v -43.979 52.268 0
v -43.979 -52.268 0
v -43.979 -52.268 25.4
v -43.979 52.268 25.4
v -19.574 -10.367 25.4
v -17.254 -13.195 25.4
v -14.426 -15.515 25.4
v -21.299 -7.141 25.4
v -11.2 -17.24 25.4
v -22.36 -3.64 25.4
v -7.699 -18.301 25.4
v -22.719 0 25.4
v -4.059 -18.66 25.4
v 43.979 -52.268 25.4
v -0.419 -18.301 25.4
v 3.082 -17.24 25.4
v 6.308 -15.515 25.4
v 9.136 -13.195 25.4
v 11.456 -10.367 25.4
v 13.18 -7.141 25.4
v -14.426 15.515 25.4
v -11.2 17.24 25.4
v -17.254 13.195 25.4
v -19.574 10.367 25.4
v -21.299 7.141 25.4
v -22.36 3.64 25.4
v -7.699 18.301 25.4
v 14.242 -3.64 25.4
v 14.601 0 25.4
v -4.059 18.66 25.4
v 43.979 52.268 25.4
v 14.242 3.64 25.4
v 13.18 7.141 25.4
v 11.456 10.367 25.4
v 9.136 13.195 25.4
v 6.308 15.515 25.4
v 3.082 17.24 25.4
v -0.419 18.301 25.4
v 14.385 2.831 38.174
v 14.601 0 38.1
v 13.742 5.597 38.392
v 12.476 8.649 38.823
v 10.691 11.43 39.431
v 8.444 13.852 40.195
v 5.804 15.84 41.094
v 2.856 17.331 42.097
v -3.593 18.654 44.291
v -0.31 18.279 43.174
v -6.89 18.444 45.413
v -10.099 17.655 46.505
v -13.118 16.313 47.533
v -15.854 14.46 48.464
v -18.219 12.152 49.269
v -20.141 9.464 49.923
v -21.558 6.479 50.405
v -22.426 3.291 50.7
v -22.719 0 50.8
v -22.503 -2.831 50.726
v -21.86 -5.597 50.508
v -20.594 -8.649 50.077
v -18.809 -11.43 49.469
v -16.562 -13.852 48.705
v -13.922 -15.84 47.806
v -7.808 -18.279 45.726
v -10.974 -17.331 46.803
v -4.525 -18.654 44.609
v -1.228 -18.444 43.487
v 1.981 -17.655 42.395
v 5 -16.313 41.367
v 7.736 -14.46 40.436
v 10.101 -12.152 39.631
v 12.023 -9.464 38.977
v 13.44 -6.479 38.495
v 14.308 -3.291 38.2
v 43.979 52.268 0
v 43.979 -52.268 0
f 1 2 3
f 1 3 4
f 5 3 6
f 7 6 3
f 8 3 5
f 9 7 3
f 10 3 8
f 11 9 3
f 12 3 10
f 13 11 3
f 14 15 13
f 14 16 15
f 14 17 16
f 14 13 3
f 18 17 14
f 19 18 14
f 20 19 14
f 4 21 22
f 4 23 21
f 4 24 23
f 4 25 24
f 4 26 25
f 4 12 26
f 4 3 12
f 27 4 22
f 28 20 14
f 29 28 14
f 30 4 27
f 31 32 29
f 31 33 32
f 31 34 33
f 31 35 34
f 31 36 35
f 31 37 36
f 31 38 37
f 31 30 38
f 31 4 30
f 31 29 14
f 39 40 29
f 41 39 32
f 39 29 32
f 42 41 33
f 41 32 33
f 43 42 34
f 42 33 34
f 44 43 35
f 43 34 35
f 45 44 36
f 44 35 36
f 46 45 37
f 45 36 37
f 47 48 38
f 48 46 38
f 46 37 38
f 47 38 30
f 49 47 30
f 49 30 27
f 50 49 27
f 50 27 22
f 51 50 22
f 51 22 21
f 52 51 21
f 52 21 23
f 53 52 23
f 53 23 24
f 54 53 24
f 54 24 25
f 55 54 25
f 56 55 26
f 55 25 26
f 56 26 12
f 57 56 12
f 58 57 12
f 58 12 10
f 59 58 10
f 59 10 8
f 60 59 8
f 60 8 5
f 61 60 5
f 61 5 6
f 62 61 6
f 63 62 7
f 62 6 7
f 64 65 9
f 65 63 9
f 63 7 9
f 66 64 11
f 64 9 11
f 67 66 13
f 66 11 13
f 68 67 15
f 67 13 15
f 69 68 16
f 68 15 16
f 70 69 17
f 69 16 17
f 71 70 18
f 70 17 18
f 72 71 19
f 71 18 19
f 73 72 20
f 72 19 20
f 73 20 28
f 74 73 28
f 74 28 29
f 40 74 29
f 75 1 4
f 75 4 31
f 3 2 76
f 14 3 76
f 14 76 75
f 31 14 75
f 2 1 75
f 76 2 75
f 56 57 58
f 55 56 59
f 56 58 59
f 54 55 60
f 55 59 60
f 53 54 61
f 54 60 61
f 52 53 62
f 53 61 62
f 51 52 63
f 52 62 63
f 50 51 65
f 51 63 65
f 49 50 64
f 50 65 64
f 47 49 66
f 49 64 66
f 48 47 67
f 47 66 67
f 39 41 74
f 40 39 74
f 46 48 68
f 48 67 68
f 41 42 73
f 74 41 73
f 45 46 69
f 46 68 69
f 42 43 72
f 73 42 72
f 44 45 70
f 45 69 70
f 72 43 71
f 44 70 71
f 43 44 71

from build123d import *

# Parameters (mm, degrees)
F0_W     = 87.957568
F0_H     = 104.53599
F1_DEPTH = 25.4
F2_R     = 18.659925
F3_DEPTH = 25.4
F5_DEPTH = 104.536989


with BuildPart() as f1:
    # F0 (on Top) → F1 (new body)
    with BuildSketch(Plane.XY):
        Rectangle(F0_W, F0_H)
    extrude(amount=F1_DEPTH)

    # F2 (on face) → F3 (join)
    with BuildSketch(Plane.XY.offset(25.4)):
        with Locations((-4.059047, 0)):
            Circle(F2_R)
    extrude(amount=F3_DEPTH)

    # F4 (on face) → F5 (cut, through all)
    with BuildSketch(Plane.XZ.offset(52.267995)):
        Polygon((14.600879, 50.8), (-22.718972, 50.8), (14.600879, 38.1), align=None)
    extrude(amount=-F5_DEPTH, mode=Mode.SUBTRACT)


solid = f1.part
